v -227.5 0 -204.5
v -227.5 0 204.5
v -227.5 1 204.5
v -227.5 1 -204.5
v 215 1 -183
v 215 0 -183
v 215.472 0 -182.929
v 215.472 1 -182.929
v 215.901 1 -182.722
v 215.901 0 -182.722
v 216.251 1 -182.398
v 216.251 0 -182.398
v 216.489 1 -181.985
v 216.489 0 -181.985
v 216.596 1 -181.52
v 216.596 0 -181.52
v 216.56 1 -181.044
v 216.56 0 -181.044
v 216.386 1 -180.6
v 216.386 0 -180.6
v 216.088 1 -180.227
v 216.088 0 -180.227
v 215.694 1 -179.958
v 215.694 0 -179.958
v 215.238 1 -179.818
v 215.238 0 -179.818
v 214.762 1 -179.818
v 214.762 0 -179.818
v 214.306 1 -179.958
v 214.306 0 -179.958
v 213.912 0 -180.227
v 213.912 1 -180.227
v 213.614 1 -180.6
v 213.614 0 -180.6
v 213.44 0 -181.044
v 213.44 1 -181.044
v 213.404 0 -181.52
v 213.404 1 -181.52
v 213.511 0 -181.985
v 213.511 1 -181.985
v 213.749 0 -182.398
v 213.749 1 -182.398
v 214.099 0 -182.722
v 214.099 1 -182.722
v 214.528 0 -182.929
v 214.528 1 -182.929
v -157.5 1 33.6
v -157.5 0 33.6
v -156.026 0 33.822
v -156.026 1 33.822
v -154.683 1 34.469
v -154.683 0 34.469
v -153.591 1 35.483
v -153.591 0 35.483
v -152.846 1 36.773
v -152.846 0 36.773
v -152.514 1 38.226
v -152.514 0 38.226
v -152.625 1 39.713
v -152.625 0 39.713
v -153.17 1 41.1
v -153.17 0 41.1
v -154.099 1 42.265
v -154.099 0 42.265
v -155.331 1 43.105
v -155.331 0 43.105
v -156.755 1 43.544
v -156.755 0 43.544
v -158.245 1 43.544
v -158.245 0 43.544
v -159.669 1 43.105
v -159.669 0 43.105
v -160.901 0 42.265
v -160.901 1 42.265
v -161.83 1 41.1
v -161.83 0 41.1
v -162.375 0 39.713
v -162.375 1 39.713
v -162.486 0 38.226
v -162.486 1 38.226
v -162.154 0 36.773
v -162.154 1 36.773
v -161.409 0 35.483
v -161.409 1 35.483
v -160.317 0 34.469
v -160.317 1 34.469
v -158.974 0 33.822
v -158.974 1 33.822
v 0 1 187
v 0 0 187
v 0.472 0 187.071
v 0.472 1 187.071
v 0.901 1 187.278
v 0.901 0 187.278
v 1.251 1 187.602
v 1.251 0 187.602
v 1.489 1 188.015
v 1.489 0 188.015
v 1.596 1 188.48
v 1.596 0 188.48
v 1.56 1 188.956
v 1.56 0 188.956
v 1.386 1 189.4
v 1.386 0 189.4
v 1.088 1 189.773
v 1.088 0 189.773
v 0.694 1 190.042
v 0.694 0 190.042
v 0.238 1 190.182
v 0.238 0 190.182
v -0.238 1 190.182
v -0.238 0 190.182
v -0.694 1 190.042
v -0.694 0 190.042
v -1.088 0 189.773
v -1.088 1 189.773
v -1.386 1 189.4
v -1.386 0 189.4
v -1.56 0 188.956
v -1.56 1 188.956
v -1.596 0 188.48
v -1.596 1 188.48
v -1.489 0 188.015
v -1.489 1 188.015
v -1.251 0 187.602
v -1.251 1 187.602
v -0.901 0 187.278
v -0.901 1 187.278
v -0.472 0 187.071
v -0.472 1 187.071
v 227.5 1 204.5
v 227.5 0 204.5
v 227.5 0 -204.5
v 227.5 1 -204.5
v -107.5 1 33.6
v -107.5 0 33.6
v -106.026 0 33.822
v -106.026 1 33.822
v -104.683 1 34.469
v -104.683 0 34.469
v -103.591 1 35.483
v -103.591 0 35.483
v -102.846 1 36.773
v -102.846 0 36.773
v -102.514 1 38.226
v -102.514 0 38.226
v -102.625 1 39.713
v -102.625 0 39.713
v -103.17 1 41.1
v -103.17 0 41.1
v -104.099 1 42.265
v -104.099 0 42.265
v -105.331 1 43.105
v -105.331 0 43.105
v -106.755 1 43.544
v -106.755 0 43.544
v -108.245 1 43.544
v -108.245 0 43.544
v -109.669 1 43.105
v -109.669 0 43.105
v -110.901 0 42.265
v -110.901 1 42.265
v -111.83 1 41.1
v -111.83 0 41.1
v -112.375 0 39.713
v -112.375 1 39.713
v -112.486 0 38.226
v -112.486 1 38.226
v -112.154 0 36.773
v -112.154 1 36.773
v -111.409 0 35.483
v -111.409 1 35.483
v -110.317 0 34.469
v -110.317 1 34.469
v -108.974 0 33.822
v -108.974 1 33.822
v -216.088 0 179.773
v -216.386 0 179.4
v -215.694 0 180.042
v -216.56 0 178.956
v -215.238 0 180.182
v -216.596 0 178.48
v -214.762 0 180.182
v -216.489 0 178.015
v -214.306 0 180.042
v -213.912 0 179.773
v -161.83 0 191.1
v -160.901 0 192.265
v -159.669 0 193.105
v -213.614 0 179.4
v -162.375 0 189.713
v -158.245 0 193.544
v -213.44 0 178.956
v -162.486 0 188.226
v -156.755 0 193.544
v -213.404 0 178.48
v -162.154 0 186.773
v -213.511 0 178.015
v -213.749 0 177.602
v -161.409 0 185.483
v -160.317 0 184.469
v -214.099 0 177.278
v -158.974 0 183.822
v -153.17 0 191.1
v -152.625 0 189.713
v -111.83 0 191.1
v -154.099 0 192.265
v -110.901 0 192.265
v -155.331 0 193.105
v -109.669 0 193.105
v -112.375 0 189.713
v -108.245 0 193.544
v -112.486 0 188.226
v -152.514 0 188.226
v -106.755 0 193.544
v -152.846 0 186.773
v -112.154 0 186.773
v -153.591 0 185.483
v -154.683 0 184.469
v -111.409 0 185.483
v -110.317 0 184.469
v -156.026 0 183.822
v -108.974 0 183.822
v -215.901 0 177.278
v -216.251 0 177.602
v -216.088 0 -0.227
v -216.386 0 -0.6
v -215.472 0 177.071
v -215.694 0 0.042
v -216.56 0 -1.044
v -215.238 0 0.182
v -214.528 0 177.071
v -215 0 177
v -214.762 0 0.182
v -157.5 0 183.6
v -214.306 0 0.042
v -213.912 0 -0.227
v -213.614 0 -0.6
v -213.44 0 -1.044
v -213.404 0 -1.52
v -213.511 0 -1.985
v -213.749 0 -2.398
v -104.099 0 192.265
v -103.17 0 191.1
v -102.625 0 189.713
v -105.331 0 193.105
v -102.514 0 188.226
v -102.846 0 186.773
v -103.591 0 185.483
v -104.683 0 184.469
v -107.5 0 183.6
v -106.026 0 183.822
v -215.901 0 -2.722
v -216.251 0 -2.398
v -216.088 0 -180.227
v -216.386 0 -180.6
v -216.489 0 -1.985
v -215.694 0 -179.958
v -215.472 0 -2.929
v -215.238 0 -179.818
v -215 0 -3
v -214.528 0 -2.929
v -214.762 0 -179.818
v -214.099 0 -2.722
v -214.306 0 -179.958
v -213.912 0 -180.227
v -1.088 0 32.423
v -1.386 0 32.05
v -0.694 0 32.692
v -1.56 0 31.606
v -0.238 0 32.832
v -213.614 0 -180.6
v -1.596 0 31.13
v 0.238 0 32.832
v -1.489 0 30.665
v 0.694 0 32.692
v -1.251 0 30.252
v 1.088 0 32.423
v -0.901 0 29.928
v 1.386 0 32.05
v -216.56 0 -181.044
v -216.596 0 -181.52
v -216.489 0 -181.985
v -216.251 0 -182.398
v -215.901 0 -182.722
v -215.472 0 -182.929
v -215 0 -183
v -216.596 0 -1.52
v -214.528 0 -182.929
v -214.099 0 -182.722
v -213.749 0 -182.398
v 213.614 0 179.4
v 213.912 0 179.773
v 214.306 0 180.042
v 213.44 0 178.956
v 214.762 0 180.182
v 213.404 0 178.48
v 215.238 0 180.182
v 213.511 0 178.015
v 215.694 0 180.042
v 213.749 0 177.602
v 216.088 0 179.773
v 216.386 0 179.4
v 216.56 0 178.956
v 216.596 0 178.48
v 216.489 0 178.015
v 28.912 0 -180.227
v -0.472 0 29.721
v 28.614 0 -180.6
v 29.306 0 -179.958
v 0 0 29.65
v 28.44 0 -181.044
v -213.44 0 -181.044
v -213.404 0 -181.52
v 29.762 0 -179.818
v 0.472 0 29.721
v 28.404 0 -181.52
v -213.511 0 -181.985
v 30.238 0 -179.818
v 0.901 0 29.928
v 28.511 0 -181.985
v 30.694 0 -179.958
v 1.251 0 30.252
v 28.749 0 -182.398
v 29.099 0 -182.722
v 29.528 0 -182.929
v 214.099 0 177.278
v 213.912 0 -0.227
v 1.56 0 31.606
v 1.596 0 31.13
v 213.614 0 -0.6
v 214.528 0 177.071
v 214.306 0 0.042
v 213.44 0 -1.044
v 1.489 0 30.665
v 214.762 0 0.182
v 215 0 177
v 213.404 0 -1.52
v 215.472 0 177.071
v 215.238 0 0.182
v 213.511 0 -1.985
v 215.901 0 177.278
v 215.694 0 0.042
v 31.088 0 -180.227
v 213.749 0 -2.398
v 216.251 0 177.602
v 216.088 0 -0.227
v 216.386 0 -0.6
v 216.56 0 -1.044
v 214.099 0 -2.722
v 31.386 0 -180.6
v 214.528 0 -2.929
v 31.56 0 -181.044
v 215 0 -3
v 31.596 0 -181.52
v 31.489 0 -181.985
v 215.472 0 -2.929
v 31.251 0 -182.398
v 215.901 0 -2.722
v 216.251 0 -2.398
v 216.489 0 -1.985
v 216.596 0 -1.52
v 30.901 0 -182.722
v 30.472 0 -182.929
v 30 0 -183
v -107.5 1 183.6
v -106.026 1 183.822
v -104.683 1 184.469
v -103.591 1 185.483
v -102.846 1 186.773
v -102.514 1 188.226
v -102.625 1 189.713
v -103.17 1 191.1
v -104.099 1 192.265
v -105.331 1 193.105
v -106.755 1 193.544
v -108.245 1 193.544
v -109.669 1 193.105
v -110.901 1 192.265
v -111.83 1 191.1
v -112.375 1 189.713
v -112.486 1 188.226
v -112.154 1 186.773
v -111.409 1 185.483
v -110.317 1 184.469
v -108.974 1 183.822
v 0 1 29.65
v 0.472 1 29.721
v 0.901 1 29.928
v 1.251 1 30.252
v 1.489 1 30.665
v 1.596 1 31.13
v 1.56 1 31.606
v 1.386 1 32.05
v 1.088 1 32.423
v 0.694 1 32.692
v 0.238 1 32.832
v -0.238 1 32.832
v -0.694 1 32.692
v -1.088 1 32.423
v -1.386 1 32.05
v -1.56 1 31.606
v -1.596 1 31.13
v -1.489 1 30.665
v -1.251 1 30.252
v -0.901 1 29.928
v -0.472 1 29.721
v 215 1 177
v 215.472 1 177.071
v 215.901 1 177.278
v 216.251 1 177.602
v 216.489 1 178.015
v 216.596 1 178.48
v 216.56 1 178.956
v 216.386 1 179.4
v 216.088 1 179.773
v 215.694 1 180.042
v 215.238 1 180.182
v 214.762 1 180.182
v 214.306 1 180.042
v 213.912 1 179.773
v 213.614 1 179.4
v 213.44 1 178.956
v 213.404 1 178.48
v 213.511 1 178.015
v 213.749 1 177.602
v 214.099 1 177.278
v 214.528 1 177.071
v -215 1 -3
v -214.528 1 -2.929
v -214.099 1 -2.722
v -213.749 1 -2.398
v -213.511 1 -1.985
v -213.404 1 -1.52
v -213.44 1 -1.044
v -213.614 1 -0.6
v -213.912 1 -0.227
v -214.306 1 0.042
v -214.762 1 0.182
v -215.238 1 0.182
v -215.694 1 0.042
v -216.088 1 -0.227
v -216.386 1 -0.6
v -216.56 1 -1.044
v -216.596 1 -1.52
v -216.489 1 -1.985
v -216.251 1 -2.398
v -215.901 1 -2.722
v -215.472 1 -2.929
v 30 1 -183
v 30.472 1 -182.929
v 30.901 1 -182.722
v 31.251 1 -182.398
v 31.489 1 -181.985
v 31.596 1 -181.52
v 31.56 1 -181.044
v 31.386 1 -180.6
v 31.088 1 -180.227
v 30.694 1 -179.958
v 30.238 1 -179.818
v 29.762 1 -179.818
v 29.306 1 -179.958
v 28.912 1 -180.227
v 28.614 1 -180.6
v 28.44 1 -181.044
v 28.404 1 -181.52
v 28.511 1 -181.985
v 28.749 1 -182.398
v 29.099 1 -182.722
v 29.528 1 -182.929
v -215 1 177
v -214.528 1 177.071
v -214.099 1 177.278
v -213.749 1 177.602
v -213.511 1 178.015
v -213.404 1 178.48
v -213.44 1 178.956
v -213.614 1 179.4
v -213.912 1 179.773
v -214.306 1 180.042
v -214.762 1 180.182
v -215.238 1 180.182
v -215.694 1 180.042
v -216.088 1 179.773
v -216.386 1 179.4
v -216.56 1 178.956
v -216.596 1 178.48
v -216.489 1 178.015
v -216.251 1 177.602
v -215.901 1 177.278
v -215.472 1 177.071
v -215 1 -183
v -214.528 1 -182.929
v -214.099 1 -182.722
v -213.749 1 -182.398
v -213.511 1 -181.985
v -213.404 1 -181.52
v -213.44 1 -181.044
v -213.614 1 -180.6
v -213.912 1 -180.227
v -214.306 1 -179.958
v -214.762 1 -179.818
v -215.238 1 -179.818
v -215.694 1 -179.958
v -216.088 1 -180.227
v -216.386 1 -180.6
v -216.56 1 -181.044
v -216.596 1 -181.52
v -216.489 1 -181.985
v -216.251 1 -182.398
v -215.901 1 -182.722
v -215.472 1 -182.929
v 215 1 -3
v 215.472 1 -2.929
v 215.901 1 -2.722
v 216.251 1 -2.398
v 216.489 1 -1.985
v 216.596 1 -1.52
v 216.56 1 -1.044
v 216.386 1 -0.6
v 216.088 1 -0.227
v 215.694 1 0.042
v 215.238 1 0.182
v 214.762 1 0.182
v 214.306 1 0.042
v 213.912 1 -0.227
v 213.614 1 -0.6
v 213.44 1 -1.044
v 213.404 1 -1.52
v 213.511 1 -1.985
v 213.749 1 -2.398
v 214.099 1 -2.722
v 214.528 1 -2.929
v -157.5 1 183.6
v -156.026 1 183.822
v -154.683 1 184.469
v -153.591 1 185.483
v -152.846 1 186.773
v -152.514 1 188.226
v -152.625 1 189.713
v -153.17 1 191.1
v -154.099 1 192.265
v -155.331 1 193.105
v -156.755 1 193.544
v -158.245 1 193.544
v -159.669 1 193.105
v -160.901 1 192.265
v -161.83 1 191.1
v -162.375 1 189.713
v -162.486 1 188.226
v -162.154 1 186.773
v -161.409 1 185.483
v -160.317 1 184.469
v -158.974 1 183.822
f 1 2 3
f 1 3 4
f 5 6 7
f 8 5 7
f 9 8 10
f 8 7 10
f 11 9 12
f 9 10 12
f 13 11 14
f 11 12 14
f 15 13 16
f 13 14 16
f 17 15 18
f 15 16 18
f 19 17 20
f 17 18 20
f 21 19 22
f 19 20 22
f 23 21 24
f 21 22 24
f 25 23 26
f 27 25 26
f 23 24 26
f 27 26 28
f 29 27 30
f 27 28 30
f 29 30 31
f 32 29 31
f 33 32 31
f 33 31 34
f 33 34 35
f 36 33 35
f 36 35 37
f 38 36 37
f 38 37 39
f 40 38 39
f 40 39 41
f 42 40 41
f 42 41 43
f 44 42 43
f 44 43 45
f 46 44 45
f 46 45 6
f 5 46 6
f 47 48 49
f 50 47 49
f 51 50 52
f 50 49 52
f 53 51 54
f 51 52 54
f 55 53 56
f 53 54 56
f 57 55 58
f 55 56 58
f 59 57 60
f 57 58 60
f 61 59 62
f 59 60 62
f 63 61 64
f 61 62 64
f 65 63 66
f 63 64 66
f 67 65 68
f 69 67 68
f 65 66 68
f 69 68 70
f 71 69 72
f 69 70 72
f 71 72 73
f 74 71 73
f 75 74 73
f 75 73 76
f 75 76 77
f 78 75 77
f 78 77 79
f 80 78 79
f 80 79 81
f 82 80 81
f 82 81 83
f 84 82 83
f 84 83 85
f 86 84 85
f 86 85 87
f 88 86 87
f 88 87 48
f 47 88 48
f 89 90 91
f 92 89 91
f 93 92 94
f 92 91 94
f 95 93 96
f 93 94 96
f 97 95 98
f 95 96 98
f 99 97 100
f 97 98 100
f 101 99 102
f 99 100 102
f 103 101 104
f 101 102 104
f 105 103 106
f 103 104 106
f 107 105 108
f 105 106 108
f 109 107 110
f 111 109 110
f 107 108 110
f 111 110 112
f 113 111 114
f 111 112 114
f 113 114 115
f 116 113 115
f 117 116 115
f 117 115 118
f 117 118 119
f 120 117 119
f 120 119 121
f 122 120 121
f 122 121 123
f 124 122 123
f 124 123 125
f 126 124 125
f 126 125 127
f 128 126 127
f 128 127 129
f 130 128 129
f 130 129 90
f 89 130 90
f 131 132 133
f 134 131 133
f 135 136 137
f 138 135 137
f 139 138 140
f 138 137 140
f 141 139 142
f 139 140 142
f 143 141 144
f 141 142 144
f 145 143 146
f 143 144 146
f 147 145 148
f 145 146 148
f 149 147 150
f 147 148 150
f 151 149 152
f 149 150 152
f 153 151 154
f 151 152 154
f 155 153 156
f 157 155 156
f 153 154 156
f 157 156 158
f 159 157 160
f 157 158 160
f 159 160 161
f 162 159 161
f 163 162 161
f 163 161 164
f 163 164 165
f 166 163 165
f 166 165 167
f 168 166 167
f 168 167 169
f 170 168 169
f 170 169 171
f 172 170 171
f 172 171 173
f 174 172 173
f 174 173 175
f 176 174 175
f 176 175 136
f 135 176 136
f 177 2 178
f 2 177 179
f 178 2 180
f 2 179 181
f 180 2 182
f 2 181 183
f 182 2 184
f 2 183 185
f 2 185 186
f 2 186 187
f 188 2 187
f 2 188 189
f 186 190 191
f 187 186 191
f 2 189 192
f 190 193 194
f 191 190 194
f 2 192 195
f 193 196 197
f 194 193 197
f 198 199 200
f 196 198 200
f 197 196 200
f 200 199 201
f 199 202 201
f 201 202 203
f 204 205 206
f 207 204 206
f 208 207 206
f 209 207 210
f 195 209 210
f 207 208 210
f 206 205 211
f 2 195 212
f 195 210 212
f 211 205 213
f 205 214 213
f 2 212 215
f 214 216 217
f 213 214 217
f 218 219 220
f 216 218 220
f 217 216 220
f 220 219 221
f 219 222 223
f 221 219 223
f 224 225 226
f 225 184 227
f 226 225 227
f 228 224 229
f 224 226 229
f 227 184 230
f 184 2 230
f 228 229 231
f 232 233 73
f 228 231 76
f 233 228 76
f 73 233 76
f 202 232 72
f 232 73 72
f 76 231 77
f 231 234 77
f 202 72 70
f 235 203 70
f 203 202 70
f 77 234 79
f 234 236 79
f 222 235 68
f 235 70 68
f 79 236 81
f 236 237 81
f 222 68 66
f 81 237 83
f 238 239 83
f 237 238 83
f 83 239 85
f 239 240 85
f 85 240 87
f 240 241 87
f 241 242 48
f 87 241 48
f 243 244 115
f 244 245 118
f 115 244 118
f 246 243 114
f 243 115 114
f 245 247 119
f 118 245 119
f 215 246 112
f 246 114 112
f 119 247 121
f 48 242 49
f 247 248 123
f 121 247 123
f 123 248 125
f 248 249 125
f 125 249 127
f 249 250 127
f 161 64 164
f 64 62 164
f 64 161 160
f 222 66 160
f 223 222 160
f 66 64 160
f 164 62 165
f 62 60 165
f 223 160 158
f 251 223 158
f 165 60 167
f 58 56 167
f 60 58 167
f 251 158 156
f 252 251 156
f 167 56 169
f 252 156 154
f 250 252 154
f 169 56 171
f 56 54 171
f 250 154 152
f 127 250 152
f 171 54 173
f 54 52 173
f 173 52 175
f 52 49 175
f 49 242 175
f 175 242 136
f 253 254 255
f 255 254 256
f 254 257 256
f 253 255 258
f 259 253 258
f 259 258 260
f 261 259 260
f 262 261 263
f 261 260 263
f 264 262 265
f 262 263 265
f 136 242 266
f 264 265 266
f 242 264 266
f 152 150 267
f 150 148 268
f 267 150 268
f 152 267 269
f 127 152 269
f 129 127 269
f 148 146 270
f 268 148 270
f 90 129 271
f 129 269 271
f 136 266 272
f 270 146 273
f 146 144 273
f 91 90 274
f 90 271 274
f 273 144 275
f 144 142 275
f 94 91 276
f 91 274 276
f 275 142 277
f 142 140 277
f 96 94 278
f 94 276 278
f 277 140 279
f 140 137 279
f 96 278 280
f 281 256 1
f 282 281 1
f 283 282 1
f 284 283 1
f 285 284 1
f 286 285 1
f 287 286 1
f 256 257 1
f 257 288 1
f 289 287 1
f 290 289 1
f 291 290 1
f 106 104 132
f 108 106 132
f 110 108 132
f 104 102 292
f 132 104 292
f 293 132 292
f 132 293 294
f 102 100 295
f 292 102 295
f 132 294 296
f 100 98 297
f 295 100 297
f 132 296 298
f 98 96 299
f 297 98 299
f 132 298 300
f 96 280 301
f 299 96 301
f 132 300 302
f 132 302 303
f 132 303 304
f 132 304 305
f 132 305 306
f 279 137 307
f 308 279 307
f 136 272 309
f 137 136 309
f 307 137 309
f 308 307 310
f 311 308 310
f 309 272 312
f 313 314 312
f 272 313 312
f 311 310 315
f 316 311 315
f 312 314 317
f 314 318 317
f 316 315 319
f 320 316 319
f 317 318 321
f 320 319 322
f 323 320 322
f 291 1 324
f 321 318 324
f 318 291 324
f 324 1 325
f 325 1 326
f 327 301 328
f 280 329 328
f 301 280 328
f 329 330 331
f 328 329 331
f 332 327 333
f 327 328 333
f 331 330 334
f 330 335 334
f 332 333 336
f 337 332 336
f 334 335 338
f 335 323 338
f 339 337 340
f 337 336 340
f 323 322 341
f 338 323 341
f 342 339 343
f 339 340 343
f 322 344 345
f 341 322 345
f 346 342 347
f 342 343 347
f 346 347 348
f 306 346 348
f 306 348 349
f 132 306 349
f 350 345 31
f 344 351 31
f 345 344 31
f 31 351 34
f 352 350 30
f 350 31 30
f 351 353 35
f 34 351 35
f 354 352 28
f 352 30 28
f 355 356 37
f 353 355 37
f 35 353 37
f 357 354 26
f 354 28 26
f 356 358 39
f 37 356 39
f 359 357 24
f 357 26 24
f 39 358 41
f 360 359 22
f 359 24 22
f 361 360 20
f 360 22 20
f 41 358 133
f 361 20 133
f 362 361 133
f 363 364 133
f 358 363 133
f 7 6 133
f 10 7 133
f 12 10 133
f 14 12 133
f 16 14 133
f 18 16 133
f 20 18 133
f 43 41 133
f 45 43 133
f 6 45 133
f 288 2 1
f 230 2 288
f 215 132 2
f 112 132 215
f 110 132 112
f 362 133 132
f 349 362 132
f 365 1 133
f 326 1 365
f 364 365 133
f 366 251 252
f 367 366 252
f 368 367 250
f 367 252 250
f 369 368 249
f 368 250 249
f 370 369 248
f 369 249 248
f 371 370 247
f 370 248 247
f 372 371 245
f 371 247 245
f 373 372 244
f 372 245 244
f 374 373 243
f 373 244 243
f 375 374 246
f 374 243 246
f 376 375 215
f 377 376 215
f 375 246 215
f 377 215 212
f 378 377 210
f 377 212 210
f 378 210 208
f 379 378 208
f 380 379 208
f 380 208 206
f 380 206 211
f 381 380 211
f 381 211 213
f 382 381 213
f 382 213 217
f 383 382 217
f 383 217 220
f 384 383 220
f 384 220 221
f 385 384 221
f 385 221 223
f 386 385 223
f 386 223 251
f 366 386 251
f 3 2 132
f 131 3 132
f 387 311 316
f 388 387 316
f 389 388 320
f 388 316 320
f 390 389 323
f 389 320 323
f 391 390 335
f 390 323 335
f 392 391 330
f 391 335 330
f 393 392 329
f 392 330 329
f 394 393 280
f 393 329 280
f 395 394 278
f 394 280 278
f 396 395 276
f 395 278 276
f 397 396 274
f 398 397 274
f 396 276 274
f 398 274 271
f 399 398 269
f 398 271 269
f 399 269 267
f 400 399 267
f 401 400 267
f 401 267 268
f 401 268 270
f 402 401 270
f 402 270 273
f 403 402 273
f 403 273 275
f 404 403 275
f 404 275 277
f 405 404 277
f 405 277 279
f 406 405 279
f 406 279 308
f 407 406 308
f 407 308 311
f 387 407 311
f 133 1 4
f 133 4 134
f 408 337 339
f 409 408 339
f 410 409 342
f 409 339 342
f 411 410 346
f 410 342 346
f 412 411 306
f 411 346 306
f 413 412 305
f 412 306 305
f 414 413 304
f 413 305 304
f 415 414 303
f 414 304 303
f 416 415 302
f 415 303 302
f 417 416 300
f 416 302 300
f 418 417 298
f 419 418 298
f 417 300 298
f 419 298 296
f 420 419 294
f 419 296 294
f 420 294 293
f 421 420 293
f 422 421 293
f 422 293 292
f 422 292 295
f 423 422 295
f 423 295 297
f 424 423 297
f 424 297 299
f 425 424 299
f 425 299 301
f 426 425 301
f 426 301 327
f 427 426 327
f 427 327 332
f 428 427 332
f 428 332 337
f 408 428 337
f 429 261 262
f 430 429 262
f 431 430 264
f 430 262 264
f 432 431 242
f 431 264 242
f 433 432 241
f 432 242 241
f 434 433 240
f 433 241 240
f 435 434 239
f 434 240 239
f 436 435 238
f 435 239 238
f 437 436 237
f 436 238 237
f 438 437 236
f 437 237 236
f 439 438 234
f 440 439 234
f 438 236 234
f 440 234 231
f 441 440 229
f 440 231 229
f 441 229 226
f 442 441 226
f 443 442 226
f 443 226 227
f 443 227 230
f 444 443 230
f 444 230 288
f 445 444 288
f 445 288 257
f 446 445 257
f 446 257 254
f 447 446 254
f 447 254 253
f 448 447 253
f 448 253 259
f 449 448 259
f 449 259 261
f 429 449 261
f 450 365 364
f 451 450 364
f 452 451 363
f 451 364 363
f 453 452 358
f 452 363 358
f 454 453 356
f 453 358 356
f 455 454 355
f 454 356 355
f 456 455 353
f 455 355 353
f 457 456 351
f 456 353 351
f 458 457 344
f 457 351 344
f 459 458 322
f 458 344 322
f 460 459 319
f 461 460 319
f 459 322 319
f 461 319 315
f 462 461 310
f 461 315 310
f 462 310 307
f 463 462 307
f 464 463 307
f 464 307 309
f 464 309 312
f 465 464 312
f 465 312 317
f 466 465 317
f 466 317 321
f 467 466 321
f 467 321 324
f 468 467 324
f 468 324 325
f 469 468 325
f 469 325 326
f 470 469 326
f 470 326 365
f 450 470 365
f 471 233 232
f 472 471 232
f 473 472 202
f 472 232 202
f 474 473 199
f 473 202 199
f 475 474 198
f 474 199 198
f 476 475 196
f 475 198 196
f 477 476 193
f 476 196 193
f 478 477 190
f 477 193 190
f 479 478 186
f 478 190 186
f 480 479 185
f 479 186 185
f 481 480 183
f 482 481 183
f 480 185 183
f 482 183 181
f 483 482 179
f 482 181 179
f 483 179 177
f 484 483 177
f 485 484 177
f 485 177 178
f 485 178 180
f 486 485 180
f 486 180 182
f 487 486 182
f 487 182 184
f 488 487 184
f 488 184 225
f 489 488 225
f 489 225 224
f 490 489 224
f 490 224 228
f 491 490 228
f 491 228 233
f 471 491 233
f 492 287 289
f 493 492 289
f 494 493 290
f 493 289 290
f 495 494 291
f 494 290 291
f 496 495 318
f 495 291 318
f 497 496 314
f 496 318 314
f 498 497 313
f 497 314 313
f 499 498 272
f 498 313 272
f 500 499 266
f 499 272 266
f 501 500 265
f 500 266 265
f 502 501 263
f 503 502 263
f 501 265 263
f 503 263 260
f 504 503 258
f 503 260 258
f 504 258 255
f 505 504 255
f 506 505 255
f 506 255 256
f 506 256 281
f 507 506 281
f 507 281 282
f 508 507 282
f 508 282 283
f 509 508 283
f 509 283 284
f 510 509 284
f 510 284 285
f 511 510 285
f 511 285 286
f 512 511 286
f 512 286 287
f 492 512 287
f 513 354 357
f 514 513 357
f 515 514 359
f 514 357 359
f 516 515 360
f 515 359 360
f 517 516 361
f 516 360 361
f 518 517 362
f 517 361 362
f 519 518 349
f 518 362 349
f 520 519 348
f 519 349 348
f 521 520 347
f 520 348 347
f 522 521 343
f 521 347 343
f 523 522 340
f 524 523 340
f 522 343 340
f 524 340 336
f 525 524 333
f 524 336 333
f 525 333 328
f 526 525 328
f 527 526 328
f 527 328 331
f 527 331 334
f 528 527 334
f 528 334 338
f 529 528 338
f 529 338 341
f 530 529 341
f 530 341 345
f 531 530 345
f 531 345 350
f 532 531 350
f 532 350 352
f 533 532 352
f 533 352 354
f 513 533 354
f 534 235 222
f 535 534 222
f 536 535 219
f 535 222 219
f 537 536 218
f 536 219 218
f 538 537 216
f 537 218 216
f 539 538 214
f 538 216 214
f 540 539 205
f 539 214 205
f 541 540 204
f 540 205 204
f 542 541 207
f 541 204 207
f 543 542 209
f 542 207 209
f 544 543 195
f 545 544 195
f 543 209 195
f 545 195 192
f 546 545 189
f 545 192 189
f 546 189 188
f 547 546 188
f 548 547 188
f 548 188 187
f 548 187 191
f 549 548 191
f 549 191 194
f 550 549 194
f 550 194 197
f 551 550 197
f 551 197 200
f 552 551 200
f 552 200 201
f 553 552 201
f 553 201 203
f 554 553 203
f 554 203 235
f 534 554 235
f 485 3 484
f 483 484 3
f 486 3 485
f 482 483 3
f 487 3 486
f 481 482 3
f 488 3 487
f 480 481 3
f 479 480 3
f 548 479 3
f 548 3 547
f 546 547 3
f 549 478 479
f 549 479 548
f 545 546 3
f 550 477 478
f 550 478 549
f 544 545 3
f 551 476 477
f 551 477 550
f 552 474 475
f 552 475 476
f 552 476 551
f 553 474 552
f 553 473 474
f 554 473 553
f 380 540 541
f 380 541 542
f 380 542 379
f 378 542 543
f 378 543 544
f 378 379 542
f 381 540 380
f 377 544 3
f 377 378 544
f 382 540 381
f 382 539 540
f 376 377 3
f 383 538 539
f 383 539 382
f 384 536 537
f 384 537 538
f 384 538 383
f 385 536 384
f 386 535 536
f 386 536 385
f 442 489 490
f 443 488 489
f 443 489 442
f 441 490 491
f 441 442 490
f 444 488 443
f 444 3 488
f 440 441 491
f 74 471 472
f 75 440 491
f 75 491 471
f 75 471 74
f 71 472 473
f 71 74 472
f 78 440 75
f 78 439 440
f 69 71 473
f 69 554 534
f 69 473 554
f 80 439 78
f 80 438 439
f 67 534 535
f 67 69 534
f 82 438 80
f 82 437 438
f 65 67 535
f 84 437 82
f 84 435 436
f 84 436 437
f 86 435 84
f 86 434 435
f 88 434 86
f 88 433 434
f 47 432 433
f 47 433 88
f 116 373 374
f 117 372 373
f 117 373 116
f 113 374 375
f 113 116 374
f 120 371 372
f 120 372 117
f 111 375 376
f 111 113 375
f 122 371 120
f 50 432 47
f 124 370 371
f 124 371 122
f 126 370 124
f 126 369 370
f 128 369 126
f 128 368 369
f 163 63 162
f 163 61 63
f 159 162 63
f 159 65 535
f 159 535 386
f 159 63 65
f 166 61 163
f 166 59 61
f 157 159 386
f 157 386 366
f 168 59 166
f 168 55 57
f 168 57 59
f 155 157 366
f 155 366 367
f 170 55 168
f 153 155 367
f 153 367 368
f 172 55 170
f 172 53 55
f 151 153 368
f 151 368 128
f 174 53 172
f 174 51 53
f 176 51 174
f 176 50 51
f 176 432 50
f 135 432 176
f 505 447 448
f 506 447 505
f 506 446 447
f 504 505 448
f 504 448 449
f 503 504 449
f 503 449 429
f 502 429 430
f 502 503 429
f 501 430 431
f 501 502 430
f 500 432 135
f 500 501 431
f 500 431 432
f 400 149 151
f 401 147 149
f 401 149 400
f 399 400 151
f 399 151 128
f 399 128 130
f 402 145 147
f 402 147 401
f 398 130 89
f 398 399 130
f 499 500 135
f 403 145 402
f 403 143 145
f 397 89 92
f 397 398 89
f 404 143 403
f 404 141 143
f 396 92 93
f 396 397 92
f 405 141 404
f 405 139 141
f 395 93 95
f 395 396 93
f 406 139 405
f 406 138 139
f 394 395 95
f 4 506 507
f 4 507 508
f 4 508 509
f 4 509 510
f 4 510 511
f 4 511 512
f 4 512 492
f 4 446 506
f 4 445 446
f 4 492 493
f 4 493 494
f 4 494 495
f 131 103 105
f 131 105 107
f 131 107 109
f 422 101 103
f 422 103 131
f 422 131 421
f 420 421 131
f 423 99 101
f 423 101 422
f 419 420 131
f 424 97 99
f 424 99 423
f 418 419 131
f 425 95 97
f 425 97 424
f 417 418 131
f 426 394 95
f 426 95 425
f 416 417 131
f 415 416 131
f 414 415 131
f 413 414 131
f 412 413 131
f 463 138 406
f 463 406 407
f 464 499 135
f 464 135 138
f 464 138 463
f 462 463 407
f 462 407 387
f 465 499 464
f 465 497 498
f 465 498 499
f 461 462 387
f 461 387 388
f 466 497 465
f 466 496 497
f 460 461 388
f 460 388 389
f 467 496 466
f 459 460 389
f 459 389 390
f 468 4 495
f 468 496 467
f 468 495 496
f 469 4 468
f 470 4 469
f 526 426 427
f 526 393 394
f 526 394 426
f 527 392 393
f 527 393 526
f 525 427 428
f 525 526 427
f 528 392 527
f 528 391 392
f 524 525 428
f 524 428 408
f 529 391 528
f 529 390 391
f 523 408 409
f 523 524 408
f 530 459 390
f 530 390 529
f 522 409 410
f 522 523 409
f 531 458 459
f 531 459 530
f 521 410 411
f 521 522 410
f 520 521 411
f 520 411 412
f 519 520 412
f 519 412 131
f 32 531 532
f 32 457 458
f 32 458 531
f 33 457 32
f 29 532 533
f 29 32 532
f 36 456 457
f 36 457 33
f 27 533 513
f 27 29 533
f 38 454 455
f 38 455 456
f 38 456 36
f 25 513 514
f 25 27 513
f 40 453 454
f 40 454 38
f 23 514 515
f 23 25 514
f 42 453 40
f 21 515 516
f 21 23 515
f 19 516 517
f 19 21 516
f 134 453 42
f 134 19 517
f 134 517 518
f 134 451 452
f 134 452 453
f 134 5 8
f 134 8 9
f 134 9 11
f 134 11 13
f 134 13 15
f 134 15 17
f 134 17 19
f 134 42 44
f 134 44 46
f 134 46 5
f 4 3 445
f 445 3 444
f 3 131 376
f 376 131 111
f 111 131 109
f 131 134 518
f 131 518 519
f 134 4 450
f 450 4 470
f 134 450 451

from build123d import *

# Parameters (mm, degrees)
CROQUIS1_W              = 455
CROQUIS1_H              = 409
SALIENTE_EXTRUIR1_DEPTH = 1
CORTAR_EXTRUIR1_REACH   = 307.904
CROQUIS2_R              = 1.6
CORTAR_EXTRUIR2_REACH   = 307.904
CROQUIS3_R              = 5
CORTAR_EXTRUIR3_REACH   = 307.904
CROQUIS4_R              = 1.6


with BuildPart() as part:
    # Croquis1 → Saliente-Extruir1 (new body)
    with BuildSketch(Plane(origin=(0, 0, 0), x_dir=(1, 0, 0), z_dir=(0, 1, 0))):
        Rectangle(CROQUIS1_W, CROQUIS1_H)
    extrude(amount=SALIENTE_EXTRUIR1_DEPTH)

    # Croquis2 → Cortar-Extruir1 (cut, up to next)
    with BuildSketch(Plane.XZ, mode=Mode.PRIVATE) as cortar_extruir1_sk1:
        with Locations(Location((-215, 178.6, 0), (0, 0, 270))):
            Circle(CROQUIS2_R)
    cortar_extruir1_tool1 = extrude(cortar_extruir1_sk1.sketch, amount=-CORTAR_EXTRUIR1_REACH, mode=Mode.PRIVATE) & part.part
    # Croquis2 → Cortar-Extruir1 (cut, up to next)
    with BuildSketch(Plane.XZ, mode=Mode.PRIVATE) as cortar_extruir1_sk2:
        with Locations(Location((-215, -181.4, 0), (0, 0, 270))):
            Circle(CROQUIS2_R)
    cortar_extruir1_tool2 = extrude(cortar_extruir1_sk2.sketch, amount=-CORTAR_EXTRUIR1_REACH, mode=Mode.PRIVATE) & part.part
    # Croquis2 → Cortar-Extruir1 (cut, up to next)
    with BuildSketch(Plane.XZ, mode=Mode.PRIVATE) as cortar_extruir1_sk3:
        with Locations(Location((215, -181.4, 0), (0, 0, 270))):
            Circle(CROQUIS2_R)
    cortar_extruir1_tool3 = extrude(cortar_extruir1_sk3.sketch, amount=-CORTAR_EXTRUIR1_REACH, mode=Mode.PRIVATE) & part.part
    # Croquis2 → Cortar-Extruir1 (cut, up to next)
    with BuildSketch(Plane.XZ, mode=Mode.PRIVATE) as cortar_extruir1_sk4:
        with Locations(Location((215, 178.6, 0), (0, 0, 270))):
            Circle(CROQUIS2_R)
    cortar_extruir1_tool4 = extrude(cortar_extruir1_sk4.sketch, amount=-CORTAR_EXTRUIR1_REACH, mode=Mode.PRIVATE) & part.part
    # Croquis2 → Cortar-Extruir1 (cut, up to next)
    with BuildSketch(Plane.XZ, mode=Mode.PRIVATE) as cortar_extruir1_sk5:
        with Locations(Location((0, 31.25, 0), (0, 0, 270))):
            Circle(CROQUIS2_R)
    cortar_extruir1_tool5 = extrude(cortar_extruir1_sk5.sketch, amount=-CORTAR_EXTRUIR1_REACH, mode=Mode.PRIVATE) & part.part
    add(cortar_extruir1_tool1.solids().sort_by_distance((-215, 0, 178.6))[0], mode=Mode.SUBTRACT)
    add(cortar_extruir1_tool2.solids().sort_by_distance((-215, 0, -181.4))[0], mode=Mode.SUBTRACT)
    add(cortar_extruir1_tool3.solids().sort_by_distance((215, 0, -181.4))[0], mode=Mode.SUBTRACT)
    add(cortar_extruir1_tool4.solids().sort_by_distance((215, 0, 178.6))[0], mode=Mode.SUBTRACT)
    add(cortar_extruir1_tool5.solids().sort_by_distance((0, 0, 31.25))[0], mode=Mode.SUBTRACT)

    # Croquis3 → Cortar-Extruir2 (cut, up to next)
    with BuildSketch(Plane.XZ, mode=Mode.PRIVATE) as cortar_extruir2_sk1:
        with Locations(Location((-157.5, 38.6, 0), (0, 0, 270))):
            Circle(CROQUIS3_R)
    cortar_extruir2_tool1 = extrude(cortar_extruir2_sk1.sketch, amount=-CORTAR_EXTRUIR2_REACH, mode=Mode.PRIVATE) & part.part
    # Croquis3 → Cortar-Extruir2 (cut, up to next)
    with BuildSketch(Plane.XZ, mode=Mode.PRIVATE) as cortar_extruir2_sk2:
        with Locations(Location((-107.5, 38.6, 0), (0, 0, 270))):
            Circle(CROQUIS3_R)
    cortar_extruir2_tool2 = extrude(cortar_extruir2_sk2.sketch, amount=-CORTAR_EXTRUIR2_REACH, mode=Mode.PRIVATE) & part.part
    # Croquis3 → Cortar-Extruir2 (cut, up to next)
    with BuildSketch(Plane.XZ, mode=Mode.PRIVATE) as cortar_extruir2_sk3:
        with Locations(Location((-107.5, 188.6, 0), (0, 0, 270))):
            Circle(CROQUIS3_R)
    cortar_extruir2_tool3 = extrude(cortar_extruir2_sk3.sketch, amount=-CORTAR_EXTRUIR2_REACH, mode=Mode.PRIVATE) & part.part
    # Croquis3 → Cortar-Extruir2 (cut, up to next)
    with BuildSketch(Plane.XZ, mode=Mode.PRIVATE) as cortar_extruir2_sk4:
        with Locations(Location((-157.5, 188.6, 0), (0, 0, 270))):
            Circle(CROQUIS3_R)
    cortar_extruir2_tool4 = extrude(cortar_extruir2_sk4.sketch, amount=-CORTAR_EXTRUIR2_REACH, mode=Mode.PRIVATE) & part.part
    add(cortar_extruir2_tool1.solids().sort_by_distance((-157.5, 0, 38.6))[0], mode=Mode.SUBTRACT)
    add(cortar_extruir2_tool2.solids().sort_by_distance((-107.5, 0, 38.6))[0], mode=Mode.SUBTRACT)
    add(cortar_extruir2_tool3.solids().sort_by_distance((-107.5, 0, 188.6))[0], mode=Mode.SUBTRACT)
    add(cortar_extruir2_tool4.solids().sort_by_distance((-157.5, 0, 188.6))[0], mode=Mode.SUBTRACT)

    # Croquis4 → Cortar-Extruir3 (cut, up to next)
    with BuildSketch(Plane.XZ, mode=Mode.PRIVATE) as cortar_extruir3_sk1:
        with Locations(Location((-215, -1.4, 0), (0, 0, 270))):
            Circle(CROQUIS4_R)
    cortar_extruir3_tool1 = extrude(cortar_extruir3_sk1.sketch, amount=-CORTAR_EXTRUIR3_REACH, mode=Mode.PRIVATE) & part.part
    # Croquis4 → Cortar-Extruir3 (cut, up to next)
    with BuildSketch(Plane.XZ, mode=Mode.PRIVATE) as cortar_extruir3_sk2:
        with Locations(Location((215, -1.4, 0), (0, 0, 270))):
            Circle(CROQUIS4_R)
    cortar_extruir3_tool2 = extrude(cortar_extruir3_sk2.sketch, amount=-CORTAR_EXTRUIR3_REACH, mode=Mode.PRIVATE) & part.part
    # Croquis4 → Cortar-Extruir3 (cut, up to next)
    with BuildSketch(Plane.XZ, mode=Mode.PRIVATE) as cortar_extruir3_sk3:
        with Locations(Location((0, 188.6, 0), (0, 0, 270))):
            Circle(CROQUIS4_R)
    cortar_extruir3_tool3 = extrude(cortar_extruir3_sk3.sketch, amount=-CORTAR_EXTRUIR3_REACH, mode=Mode.PRIVATE) & part.part
    # Croquis4 → Cortar-Extruir3 (cut, up to next)
    with BuildSketch(Plane.XZ, mode=Mode.PRIVATE) as cortar_extruir3_sk4:
        with Locations(Location((30, -181.4, 0), (0, 0, 270))):
            Circle(CROQUIS4_R)
    cortar_extruir3_tool4 = extrude(cortar_extruir3_sk4.sketch, amount=-CORTAR_EXTRUIR3_REACH, mode=Mode.PRIVATE) & part.part
    add(cortar_extruir3_tool1.solids().sort_by_distance((-215, 0, -1.4))[0], mode=Mode.SUBTRACT)
    add(cortar_extruir3_tool2.solids().sort_by_distance((215, 0, -1.4))[0], mode=Mode.SUBTRACT)
    add(cortar_extruir3_tool3.solids().sort_by_distance((0, 0, 188.6))[0], mode=Mode.SUBTRACT)
    add(cortar_extruir3_tool4.solids().sort_by_distance((30, 0, -181.4))[0], mode=Mode.SUBTRACT)


solid = part.part
